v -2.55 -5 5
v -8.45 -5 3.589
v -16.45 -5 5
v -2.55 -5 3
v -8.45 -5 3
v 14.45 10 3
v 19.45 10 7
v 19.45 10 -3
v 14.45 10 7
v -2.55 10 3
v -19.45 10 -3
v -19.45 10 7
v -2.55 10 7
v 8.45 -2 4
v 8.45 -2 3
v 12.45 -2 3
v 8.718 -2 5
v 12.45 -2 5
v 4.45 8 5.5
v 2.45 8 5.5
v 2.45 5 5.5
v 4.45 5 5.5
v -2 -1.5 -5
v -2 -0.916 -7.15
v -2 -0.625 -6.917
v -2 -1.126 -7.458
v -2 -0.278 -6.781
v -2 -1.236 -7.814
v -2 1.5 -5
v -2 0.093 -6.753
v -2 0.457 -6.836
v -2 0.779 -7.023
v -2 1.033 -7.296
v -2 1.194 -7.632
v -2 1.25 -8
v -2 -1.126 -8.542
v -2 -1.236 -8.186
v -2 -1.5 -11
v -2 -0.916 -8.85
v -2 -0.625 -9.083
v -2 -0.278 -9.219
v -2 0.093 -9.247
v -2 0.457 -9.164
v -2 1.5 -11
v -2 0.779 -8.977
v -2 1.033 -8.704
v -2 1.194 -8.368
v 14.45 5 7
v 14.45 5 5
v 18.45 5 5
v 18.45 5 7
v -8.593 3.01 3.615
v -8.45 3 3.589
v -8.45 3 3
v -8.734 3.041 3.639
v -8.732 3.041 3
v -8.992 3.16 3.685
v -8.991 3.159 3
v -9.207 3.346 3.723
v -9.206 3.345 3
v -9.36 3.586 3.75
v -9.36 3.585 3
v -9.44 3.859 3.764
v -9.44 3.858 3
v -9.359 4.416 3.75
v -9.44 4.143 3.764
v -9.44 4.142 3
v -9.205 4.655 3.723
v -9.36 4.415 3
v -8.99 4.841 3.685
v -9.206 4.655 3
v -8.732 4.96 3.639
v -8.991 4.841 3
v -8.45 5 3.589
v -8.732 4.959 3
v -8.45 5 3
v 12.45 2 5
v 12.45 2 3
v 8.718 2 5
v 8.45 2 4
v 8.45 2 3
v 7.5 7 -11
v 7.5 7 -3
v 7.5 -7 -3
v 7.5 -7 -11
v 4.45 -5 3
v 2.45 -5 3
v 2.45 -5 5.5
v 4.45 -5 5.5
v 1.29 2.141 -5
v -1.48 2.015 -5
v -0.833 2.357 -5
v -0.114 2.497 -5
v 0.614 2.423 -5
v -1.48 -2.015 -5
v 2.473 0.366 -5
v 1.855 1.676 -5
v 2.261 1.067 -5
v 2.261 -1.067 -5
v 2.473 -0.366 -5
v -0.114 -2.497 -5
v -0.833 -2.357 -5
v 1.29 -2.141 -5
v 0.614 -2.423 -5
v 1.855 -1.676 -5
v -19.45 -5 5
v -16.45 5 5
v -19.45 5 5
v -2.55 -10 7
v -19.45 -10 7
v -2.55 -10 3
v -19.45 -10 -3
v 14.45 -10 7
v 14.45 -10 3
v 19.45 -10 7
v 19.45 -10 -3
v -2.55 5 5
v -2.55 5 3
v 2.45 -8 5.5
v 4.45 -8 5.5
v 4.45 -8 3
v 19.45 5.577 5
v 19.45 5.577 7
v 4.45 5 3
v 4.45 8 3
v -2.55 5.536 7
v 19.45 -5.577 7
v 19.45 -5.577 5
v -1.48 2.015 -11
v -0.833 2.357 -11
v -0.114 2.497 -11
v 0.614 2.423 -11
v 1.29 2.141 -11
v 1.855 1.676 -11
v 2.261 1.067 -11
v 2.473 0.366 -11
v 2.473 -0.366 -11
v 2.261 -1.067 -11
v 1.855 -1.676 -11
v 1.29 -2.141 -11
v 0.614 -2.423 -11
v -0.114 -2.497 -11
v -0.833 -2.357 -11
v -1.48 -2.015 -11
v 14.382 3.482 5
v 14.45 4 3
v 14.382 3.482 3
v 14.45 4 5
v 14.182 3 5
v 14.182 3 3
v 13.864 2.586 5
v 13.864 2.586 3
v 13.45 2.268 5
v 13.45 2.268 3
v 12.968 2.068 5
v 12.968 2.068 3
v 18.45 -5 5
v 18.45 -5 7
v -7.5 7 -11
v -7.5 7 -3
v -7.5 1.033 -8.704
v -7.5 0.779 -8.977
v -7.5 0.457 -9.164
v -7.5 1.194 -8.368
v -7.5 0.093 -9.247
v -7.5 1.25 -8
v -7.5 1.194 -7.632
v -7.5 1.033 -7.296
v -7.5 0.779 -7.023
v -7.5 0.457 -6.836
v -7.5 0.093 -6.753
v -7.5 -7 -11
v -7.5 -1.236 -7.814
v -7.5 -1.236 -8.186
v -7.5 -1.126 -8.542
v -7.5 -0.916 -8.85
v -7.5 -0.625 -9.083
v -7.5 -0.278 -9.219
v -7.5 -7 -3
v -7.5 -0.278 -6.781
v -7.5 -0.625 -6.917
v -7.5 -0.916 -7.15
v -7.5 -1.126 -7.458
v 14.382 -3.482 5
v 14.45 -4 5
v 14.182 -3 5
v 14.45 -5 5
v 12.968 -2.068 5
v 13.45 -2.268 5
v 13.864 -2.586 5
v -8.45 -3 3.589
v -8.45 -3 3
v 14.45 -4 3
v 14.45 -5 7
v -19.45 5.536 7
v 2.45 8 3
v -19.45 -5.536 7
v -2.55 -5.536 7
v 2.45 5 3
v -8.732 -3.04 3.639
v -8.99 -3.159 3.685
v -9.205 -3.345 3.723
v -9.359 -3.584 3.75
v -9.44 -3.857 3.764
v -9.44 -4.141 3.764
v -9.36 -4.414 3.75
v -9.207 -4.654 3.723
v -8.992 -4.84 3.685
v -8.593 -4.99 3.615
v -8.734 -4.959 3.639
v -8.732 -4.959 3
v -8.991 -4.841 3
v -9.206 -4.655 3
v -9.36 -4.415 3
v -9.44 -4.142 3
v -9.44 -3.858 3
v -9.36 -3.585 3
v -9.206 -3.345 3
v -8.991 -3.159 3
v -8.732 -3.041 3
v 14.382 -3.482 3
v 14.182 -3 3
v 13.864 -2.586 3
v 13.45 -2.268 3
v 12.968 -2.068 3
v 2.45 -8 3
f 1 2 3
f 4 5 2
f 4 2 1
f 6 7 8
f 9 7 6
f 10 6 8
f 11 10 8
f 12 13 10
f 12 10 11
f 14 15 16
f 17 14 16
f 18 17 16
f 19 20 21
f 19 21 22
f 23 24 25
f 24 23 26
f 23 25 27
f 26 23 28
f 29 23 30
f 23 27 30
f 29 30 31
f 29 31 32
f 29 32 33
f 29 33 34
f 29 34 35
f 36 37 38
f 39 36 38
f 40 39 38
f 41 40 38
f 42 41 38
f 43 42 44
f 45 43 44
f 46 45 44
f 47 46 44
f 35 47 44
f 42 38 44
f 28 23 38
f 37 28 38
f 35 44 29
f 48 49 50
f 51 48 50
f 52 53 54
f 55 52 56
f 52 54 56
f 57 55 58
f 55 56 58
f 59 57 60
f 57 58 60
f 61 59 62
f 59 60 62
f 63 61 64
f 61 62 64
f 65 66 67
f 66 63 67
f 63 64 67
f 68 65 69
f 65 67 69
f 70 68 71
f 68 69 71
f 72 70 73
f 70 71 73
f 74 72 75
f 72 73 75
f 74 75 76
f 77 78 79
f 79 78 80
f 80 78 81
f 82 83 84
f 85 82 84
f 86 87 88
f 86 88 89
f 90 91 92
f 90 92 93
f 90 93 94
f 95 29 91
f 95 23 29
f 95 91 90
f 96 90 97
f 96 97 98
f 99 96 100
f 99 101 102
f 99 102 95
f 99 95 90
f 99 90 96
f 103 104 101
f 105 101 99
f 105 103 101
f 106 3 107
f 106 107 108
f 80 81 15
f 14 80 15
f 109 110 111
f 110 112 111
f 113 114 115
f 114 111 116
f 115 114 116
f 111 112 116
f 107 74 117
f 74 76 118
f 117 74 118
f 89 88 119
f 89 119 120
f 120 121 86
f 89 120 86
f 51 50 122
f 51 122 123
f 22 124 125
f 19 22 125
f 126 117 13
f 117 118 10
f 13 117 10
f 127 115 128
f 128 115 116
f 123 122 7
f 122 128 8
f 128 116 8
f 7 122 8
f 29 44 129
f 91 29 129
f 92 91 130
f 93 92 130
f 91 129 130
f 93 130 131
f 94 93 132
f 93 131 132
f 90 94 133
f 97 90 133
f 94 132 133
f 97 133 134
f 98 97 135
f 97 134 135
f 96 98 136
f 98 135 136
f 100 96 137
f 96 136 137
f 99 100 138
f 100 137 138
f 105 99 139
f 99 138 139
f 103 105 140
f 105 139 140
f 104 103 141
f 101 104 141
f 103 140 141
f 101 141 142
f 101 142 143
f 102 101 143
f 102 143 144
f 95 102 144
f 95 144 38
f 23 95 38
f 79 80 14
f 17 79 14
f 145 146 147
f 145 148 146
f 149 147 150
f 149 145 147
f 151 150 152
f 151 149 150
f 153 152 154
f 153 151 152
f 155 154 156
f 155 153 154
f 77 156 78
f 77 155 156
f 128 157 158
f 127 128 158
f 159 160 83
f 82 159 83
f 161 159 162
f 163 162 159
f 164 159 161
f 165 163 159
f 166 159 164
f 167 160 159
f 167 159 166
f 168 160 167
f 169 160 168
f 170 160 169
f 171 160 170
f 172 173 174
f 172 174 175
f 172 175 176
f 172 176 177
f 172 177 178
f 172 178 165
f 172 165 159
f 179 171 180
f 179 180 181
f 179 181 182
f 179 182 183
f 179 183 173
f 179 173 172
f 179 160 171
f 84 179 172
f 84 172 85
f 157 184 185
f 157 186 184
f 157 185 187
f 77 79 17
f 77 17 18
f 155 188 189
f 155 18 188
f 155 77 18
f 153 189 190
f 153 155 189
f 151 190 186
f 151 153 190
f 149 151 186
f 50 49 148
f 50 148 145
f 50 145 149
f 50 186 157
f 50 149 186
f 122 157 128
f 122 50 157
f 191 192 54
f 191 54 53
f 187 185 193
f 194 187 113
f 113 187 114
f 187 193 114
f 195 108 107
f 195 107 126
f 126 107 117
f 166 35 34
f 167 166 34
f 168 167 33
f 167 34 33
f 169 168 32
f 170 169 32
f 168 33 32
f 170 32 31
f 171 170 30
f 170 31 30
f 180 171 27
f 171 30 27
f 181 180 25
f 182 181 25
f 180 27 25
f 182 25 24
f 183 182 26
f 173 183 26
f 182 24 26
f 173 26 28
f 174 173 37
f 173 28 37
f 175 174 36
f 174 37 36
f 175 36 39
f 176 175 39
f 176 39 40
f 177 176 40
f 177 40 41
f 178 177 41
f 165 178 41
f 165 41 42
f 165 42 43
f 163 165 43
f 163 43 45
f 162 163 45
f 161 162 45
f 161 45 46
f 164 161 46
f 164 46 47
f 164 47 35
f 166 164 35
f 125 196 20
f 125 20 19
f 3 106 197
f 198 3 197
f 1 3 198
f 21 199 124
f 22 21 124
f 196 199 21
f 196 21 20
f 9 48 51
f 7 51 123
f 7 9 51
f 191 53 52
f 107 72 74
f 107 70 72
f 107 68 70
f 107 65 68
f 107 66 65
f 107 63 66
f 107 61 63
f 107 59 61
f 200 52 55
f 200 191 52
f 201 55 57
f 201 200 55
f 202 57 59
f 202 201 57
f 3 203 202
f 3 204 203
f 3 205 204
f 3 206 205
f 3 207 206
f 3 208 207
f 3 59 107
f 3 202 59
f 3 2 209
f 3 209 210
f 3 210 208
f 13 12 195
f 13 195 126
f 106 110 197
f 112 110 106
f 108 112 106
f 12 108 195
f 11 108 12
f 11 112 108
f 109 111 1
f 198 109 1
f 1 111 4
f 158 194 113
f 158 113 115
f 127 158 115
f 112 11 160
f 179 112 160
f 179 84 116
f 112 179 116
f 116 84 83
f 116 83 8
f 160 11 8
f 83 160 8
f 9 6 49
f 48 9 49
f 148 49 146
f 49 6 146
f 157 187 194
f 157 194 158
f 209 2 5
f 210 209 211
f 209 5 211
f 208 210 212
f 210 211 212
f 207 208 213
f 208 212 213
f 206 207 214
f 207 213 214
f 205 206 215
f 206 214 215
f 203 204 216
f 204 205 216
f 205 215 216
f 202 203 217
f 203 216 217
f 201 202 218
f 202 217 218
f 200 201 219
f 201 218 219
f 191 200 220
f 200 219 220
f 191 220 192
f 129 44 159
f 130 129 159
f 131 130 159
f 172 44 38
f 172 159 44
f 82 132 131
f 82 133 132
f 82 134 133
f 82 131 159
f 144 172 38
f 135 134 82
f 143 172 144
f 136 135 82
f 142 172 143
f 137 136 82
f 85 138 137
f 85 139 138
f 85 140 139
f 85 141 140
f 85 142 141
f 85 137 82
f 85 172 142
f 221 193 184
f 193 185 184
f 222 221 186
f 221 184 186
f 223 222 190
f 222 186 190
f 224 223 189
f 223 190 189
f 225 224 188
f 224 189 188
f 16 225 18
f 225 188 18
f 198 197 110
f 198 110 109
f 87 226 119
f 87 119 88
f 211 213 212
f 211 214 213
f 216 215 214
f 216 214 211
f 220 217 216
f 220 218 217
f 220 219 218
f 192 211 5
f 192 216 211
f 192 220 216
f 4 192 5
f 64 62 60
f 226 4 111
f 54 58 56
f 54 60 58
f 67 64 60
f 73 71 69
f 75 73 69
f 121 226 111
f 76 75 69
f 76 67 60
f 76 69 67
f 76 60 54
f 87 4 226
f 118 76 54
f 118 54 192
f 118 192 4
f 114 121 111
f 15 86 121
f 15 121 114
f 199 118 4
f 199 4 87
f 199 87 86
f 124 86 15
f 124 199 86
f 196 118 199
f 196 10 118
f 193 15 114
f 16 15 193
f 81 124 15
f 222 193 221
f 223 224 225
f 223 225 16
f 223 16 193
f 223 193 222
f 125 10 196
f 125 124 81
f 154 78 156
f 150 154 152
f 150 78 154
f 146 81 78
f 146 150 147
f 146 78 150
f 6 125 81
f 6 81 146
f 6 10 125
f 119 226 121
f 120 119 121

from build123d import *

# Parameters (mm, degrees)
F1_DEPTH    = 3
F3_DEPTH    = 5
F5_D        = 2
F5_DEPTH    = 2.001
F6_W        = 16.9
F6_H        = 5
F6_W_2      = 5
F7_DEPTH    = 4
F8_W        = 2
F8_H        = 3
F9_DEPTH    = 2.5
F11_DEPTH   = 2
F12_R       = 2
F13_SIZE2   = 1
F13_SIZE    = 0.2679491924
F14_SIZE2   = 2
F14_SIZE    = 0.5358983849
F14_2_SIZE2 = 2
F14_2_SIZE  = 0.5358983849
F15_SIZE2   = 1
F15_SIZE    = 0.5773502692
F16_W       = 15
F16_H       = 14
F17_DEPTH   = 8
F19_DEPTH   = 6
F21_D       = 2.5
F21_DEPTH   = 7.5
F21_TIP     = 0.7510757738


with BuildPart() as f1:
    # F0 (on Top) → F1 (new body, symmetric)
    with BuildSketch(Plane.XY):
        Polygon((19.45, 10), (0, 10), (-19.45, 10), (-19.45, -10), (19.45, -10), align=None)
    extrude(amount=F1_DEPTH, both=True)

    # F2 (on Front) → F3 (join, symmetric)
    with BuildSketch(Plane.XZ):
        Polygon((-8.45, 3.5893841543), (-16.45, 5), (-19.45, 5), (-19.45, 3), (-8.45, 3), align=None)
    extrude(amount=F3_DEPTH, both=True)

    # F5 (through all, one way)
    with BuildSketch(Plane(origin=(0, 0, 3), x_dir=(1, 0, 0), z_dir=(0, 0, -1))):
        with Locations((-8.45, -4), (-8.45, 4)):
            Circle(F5_D / 2)
    extrude(amount=-F5_DEPTH, mode=Mode.SUBTRACT)

    # F6 (on face) → F7 (join)
    with BuildSketch(Plane.XY.offset(3)):
        with Locations((-11, -7.5)):
            Rectangle(F6_W, F6_H)
        with Locations((-11, 7.5)):
            Rectangle(F6_W, F6_H)
        with Locations((16.95, 7.5)):
            Rectangle(F6_W_2, F6_H)
        with Locations((16.95, -7.5)):
            Rectangle(F6_W_2, F6_H)
    extrude(amount=F7_DEPTH)

    # F8 (on face) → F9 (join)
    with BuildSketch(Plane.XY.offset(3)):
        with Locations((3.45, 6.5)):
            Rectangle(F8_W, F8_H)
        with Locations((3.45, -6.5)):
            Rectangle(F8_W, F8_H)
    extrude(amount=F9_DEPTH)

    # F10 (on face) → F11 (join)
    with BuildSketch(Plane.XY.offset(3)):
        Polygon((19.45, -5), (19.45, 5), (14.45, 5), (14.45, 2), (8.45, 2), (8.45, -2), (14.45, -2), (14.45, -5), align=None)
    extrude(amount=F11_DEPTH)

    # F12
    f12_edges = [f1.edges().sort_by_distance(p)[0] for p in [
        (14.45, -2, 4),
        (14.45, 2, 4),
    ]]
    fillet(f12_edges, radius=F12_R)

    # F13
    f13_edges = [f1.edges().sort_by_distance(p)[0] for p in [
        (8.45, 0, 5),
    ]]
    f13_side = f1.faces().sort_by_distance((15.139847, 0, 5))[0]
    chamfer(f13_edges, length=F13_SIZE, length2=F13_SIZE2, reference=f13_side)

    # F14
    f14_edges = [f1.edges().sort_by_distance(p)[0] for p in [
        (-11, 5, 7),
    ]]
    f14_side = f1.faces().sort_by_distance((-11, 7.5, 7))[0]
    chamfer(f14_edges, length=F14_SIZE, length2=F14_SIZE2, reference=f14_side)

    # F14#2
    f14_2_edges = [f1.edges().sort_by_distance(p)[0] for p in [
        (-11, -5, 7),
    ]]
    f14_2_side = f1.faces().sort_by_distance((-11, -7.5, 7))[0]
    chamfer(f14_2_edges, length=F14_2_SIZE, length2=F14_2_SIZE2, reference=f14_2_side)

    # F15
    f15_edges = [f1.edges().sort_by_distance(p)[0] for p in [
        (19.45, 5, 6),
        (19.45, -5, 6),
    ]]
    f15_side = f1.faces().sort_by_distance((19.45, 0, 1.555556))[0]
    chamfer(f15_edges, length=F15_SIZE, length2=F15_SIZE2, reference=f15_side)

    # F16 (on face) → F17 (join)
    with BuildSketch(Plane(origin=(0, 0, -3), x_dir=(1, 0, 0), z_dir=(0, 0, -1))):
        Rectangle(F16_W, F16_H)
    extrude(amount=F17_DEPTH)

    # F18 (on face) → F19 (cut)
    with BuildSketch(Plane(origin=(0, 0, -11), x_dir=(1, 0, 0), z_dir=(0, 0, -1))):
        with BuildLine():
            Line((-2, 0), (-2, -1.5))
            ThreePointArc((-2, -1.5), (2.5, 0), (-2, 1.5))
            Line((-2, 1.5), (-2, 0))
        make_face()
    extrude(amount=-F19_DEPTH, mode=Mode.SUBTRACT)

    # F21
    with Locations(Plane(origin=(-7.5, 0, 0), x_dir=(0, -1, 0), z_dir=(-1, 0, 0))):
        with Locations((0, -8)):
            Hole(F21_D / 2, depth=F21_DEPTH)
            with Locations((0, 0, -(F21_DEPTH + F21_TIP / 2))):  # 118° drill point
                Cone(0, F21_D / 2, F21_TIP, mode=Mode.SUBTRACT)


solid = f1.part
